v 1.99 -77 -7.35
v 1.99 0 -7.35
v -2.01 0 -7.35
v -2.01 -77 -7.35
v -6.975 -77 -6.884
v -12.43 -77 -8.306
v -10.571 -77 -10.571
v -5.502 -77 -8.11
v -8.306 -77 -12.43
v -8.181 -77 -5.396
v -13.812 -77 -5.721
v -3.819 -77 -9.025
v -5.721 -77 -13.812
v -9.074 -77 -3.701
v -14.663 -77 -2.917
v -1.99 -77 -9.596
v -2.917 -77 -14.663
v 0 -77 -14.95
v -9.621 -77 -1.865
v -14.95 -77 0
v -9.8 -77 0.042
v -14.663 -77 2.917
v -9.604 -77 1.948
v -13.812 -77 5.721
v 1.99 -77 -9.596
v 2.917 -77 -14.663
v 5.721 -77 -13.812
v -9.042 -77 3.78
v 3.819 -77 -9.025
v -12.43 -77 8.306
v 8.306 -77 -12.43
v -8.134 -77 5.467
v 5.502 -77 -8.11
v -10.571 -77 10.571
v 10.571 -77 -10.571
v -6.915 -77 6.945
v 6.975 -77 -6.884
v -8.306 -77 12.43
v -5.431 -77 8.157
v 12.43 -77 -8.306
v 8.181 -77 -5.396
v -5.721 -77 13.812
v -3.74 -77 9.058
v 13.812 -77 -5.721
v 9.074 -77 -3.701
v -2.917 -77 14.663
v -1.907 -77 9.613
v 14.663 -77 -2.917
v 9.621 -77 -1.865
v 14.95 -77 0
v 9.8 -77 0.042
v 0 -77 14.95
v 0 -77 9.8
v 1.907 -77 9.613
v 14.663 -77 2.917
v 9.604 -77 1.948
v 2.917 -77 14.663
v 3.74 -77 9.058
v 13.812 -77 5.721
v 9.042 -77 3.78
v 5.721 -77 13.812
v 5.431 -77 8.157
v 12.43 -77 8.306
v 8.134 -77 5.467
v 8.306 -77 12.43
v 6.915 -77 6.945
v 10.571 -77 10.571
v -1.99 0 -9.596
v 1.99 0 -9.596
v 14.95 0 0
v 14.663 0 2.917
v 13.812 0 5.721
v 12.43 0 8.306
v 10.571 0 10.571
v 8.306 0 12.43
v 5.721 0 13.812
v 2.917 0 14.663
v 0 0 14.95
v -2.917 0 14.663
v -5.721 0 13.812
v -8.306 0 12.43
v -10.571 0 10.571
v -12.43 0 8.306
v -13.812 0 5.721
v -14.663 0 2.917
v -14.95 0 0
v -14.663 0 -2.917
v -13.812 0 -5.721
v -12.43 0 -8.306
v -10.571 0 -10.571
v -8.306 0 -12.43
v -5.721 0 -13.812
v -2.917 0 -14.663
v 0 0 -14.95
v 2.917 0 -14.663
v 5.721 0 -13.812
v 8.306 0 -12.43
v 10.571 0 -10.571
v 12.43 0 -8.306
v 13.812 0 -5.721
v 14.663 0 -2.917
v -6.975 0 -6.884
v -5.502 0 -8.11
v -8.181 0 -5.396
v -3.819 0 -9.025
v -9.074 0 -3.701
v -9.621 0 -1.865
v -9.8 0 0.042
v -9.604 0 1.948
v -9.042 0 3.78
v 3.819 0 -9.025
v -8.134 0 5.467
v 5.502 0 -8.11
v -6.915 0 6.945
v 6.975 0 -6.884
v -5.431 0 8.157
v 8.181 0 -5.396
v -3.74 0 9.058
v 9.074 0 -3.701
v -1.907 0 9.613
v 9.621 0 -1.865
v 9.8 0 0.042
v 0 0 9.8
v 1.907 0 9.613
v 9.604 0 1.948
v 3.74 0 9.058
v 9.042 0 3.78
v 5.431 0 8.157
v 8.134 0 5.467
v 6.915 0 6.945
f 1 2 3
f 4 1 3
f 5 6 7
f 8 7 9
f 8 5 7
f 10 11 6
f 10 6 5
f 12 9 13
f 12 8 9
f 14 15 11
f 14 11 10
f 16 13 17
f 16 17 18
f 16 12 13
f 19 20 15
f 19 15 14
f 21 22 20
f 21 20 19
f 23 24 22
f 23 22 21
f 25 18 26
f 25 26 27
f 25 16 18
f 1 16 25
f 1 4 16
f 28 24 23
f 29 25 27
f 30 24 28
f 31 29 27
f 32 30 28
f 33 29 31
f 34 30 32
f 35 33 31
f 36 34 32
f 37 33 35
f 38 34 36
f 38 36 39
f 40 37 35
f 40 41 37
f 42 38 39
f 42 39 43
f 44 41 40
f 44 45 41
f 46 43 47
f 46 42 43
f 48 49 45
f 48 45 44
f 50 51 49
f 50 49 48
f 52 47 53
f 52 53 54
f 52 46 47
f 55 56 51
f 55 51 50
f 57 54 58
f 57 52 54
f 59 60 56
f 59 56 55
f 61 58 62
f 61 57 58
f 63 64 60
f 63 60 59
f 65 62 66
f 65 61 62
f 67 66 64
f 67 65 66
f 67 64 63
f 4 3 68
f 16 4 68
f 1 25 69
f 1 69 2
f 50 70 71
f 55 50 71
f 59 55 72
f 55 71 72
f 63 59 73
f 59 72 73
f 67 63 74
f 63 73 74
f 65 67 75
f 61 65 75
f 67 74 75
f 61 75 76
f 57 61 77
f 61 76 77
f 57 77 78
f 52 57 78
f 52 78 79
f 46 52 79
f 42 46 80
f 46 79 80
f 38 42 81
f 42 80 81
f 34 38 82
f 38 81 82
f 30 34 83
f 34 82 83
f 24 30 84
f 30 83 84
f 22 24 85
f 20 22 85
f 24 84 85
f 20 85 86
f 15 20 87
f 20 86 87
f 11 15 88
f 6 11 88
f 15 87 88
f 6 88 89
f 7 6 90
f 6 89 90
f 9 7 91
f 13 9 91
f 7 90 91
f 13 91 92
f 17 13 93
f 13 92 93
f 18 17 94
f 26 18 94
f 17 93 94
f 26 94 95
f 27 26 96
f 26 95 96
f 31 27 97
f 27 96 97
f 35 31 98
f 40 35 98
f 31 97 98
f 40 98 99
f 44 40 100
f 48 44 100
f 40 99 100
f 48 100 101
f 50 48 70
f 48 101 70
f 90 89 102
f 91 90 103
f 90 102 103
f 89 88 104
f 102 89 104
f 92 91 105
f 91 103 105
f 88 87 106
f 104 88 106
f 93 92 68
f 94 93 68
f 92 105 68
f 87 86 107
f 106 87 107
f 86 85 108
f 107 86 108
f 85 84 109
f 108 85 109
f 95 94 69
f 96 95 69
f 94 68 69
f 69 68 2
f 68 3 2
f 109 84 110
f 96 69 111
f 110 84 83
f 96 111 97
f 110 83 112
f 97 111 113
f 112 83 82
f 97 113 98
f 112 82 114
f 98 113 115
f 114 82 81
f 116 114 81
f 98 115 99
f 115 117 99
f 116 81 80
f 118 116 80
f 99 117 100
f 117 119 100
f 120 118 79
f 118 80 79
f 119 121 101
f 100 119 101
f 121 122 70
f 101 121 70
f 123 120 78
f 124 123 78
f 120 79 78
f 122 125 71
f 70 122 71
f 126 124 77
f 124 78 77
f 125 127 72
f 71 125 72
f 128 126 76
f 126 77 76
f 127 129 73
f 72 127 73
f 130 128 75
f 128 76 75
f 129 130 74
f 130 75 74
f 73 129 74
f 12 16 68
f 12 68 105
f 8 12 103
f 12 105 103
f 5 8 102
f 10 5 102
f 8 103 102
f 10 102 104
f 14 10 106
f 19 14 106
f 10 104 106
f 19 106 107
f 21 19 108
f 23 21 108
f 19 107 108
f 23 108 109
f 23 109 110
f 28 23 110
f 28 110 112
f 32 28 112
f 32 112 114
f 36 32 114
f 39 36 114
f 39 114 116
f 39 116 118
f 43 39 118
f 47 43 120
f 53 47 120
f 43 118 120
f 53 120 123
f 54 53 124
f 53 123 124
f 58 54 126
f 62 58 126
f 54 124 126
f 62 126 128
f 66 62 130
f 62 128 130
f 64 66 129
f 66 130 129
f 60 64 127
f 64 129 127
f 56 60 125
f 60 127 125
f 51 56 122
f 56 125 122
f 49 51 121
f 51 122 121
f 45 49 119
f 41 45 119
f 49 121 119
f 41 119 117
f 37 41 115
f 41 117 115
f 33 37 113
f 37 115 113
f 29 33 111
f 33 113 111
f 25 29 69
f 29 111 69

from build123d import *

# Parameters (mm, degrees)
F0_R     = 14.95
F1_DEPTH = 77


# Not quite as in the source:
# - a feature names something its author has since deleted; it is built from what else it names


with BuildPart() as f1:
    # F0 (on Front) → F1 (new body)
    with BuildSketch(Plane.XZ):
        Circle(F0_R)
        with BuildLine():
            ThreePointArc((-1.9898477157, -9.5958587978), (0, 9.8), (1.9898477157, -9.5958587978))
            Line((1.9898477157, -9.5958587978), (1.9898477157, -7.35))
            Line((1.9898477157, -7.35), (-2.0101522843, -7.35))
            Line((-2.0101522843, -7.35), (-1.9898477157, -9.5958587978))
        make_face(mode=Mode.SUBTRACT)
    extrude(amount=F1_DEPTH)


solid = f1.part
